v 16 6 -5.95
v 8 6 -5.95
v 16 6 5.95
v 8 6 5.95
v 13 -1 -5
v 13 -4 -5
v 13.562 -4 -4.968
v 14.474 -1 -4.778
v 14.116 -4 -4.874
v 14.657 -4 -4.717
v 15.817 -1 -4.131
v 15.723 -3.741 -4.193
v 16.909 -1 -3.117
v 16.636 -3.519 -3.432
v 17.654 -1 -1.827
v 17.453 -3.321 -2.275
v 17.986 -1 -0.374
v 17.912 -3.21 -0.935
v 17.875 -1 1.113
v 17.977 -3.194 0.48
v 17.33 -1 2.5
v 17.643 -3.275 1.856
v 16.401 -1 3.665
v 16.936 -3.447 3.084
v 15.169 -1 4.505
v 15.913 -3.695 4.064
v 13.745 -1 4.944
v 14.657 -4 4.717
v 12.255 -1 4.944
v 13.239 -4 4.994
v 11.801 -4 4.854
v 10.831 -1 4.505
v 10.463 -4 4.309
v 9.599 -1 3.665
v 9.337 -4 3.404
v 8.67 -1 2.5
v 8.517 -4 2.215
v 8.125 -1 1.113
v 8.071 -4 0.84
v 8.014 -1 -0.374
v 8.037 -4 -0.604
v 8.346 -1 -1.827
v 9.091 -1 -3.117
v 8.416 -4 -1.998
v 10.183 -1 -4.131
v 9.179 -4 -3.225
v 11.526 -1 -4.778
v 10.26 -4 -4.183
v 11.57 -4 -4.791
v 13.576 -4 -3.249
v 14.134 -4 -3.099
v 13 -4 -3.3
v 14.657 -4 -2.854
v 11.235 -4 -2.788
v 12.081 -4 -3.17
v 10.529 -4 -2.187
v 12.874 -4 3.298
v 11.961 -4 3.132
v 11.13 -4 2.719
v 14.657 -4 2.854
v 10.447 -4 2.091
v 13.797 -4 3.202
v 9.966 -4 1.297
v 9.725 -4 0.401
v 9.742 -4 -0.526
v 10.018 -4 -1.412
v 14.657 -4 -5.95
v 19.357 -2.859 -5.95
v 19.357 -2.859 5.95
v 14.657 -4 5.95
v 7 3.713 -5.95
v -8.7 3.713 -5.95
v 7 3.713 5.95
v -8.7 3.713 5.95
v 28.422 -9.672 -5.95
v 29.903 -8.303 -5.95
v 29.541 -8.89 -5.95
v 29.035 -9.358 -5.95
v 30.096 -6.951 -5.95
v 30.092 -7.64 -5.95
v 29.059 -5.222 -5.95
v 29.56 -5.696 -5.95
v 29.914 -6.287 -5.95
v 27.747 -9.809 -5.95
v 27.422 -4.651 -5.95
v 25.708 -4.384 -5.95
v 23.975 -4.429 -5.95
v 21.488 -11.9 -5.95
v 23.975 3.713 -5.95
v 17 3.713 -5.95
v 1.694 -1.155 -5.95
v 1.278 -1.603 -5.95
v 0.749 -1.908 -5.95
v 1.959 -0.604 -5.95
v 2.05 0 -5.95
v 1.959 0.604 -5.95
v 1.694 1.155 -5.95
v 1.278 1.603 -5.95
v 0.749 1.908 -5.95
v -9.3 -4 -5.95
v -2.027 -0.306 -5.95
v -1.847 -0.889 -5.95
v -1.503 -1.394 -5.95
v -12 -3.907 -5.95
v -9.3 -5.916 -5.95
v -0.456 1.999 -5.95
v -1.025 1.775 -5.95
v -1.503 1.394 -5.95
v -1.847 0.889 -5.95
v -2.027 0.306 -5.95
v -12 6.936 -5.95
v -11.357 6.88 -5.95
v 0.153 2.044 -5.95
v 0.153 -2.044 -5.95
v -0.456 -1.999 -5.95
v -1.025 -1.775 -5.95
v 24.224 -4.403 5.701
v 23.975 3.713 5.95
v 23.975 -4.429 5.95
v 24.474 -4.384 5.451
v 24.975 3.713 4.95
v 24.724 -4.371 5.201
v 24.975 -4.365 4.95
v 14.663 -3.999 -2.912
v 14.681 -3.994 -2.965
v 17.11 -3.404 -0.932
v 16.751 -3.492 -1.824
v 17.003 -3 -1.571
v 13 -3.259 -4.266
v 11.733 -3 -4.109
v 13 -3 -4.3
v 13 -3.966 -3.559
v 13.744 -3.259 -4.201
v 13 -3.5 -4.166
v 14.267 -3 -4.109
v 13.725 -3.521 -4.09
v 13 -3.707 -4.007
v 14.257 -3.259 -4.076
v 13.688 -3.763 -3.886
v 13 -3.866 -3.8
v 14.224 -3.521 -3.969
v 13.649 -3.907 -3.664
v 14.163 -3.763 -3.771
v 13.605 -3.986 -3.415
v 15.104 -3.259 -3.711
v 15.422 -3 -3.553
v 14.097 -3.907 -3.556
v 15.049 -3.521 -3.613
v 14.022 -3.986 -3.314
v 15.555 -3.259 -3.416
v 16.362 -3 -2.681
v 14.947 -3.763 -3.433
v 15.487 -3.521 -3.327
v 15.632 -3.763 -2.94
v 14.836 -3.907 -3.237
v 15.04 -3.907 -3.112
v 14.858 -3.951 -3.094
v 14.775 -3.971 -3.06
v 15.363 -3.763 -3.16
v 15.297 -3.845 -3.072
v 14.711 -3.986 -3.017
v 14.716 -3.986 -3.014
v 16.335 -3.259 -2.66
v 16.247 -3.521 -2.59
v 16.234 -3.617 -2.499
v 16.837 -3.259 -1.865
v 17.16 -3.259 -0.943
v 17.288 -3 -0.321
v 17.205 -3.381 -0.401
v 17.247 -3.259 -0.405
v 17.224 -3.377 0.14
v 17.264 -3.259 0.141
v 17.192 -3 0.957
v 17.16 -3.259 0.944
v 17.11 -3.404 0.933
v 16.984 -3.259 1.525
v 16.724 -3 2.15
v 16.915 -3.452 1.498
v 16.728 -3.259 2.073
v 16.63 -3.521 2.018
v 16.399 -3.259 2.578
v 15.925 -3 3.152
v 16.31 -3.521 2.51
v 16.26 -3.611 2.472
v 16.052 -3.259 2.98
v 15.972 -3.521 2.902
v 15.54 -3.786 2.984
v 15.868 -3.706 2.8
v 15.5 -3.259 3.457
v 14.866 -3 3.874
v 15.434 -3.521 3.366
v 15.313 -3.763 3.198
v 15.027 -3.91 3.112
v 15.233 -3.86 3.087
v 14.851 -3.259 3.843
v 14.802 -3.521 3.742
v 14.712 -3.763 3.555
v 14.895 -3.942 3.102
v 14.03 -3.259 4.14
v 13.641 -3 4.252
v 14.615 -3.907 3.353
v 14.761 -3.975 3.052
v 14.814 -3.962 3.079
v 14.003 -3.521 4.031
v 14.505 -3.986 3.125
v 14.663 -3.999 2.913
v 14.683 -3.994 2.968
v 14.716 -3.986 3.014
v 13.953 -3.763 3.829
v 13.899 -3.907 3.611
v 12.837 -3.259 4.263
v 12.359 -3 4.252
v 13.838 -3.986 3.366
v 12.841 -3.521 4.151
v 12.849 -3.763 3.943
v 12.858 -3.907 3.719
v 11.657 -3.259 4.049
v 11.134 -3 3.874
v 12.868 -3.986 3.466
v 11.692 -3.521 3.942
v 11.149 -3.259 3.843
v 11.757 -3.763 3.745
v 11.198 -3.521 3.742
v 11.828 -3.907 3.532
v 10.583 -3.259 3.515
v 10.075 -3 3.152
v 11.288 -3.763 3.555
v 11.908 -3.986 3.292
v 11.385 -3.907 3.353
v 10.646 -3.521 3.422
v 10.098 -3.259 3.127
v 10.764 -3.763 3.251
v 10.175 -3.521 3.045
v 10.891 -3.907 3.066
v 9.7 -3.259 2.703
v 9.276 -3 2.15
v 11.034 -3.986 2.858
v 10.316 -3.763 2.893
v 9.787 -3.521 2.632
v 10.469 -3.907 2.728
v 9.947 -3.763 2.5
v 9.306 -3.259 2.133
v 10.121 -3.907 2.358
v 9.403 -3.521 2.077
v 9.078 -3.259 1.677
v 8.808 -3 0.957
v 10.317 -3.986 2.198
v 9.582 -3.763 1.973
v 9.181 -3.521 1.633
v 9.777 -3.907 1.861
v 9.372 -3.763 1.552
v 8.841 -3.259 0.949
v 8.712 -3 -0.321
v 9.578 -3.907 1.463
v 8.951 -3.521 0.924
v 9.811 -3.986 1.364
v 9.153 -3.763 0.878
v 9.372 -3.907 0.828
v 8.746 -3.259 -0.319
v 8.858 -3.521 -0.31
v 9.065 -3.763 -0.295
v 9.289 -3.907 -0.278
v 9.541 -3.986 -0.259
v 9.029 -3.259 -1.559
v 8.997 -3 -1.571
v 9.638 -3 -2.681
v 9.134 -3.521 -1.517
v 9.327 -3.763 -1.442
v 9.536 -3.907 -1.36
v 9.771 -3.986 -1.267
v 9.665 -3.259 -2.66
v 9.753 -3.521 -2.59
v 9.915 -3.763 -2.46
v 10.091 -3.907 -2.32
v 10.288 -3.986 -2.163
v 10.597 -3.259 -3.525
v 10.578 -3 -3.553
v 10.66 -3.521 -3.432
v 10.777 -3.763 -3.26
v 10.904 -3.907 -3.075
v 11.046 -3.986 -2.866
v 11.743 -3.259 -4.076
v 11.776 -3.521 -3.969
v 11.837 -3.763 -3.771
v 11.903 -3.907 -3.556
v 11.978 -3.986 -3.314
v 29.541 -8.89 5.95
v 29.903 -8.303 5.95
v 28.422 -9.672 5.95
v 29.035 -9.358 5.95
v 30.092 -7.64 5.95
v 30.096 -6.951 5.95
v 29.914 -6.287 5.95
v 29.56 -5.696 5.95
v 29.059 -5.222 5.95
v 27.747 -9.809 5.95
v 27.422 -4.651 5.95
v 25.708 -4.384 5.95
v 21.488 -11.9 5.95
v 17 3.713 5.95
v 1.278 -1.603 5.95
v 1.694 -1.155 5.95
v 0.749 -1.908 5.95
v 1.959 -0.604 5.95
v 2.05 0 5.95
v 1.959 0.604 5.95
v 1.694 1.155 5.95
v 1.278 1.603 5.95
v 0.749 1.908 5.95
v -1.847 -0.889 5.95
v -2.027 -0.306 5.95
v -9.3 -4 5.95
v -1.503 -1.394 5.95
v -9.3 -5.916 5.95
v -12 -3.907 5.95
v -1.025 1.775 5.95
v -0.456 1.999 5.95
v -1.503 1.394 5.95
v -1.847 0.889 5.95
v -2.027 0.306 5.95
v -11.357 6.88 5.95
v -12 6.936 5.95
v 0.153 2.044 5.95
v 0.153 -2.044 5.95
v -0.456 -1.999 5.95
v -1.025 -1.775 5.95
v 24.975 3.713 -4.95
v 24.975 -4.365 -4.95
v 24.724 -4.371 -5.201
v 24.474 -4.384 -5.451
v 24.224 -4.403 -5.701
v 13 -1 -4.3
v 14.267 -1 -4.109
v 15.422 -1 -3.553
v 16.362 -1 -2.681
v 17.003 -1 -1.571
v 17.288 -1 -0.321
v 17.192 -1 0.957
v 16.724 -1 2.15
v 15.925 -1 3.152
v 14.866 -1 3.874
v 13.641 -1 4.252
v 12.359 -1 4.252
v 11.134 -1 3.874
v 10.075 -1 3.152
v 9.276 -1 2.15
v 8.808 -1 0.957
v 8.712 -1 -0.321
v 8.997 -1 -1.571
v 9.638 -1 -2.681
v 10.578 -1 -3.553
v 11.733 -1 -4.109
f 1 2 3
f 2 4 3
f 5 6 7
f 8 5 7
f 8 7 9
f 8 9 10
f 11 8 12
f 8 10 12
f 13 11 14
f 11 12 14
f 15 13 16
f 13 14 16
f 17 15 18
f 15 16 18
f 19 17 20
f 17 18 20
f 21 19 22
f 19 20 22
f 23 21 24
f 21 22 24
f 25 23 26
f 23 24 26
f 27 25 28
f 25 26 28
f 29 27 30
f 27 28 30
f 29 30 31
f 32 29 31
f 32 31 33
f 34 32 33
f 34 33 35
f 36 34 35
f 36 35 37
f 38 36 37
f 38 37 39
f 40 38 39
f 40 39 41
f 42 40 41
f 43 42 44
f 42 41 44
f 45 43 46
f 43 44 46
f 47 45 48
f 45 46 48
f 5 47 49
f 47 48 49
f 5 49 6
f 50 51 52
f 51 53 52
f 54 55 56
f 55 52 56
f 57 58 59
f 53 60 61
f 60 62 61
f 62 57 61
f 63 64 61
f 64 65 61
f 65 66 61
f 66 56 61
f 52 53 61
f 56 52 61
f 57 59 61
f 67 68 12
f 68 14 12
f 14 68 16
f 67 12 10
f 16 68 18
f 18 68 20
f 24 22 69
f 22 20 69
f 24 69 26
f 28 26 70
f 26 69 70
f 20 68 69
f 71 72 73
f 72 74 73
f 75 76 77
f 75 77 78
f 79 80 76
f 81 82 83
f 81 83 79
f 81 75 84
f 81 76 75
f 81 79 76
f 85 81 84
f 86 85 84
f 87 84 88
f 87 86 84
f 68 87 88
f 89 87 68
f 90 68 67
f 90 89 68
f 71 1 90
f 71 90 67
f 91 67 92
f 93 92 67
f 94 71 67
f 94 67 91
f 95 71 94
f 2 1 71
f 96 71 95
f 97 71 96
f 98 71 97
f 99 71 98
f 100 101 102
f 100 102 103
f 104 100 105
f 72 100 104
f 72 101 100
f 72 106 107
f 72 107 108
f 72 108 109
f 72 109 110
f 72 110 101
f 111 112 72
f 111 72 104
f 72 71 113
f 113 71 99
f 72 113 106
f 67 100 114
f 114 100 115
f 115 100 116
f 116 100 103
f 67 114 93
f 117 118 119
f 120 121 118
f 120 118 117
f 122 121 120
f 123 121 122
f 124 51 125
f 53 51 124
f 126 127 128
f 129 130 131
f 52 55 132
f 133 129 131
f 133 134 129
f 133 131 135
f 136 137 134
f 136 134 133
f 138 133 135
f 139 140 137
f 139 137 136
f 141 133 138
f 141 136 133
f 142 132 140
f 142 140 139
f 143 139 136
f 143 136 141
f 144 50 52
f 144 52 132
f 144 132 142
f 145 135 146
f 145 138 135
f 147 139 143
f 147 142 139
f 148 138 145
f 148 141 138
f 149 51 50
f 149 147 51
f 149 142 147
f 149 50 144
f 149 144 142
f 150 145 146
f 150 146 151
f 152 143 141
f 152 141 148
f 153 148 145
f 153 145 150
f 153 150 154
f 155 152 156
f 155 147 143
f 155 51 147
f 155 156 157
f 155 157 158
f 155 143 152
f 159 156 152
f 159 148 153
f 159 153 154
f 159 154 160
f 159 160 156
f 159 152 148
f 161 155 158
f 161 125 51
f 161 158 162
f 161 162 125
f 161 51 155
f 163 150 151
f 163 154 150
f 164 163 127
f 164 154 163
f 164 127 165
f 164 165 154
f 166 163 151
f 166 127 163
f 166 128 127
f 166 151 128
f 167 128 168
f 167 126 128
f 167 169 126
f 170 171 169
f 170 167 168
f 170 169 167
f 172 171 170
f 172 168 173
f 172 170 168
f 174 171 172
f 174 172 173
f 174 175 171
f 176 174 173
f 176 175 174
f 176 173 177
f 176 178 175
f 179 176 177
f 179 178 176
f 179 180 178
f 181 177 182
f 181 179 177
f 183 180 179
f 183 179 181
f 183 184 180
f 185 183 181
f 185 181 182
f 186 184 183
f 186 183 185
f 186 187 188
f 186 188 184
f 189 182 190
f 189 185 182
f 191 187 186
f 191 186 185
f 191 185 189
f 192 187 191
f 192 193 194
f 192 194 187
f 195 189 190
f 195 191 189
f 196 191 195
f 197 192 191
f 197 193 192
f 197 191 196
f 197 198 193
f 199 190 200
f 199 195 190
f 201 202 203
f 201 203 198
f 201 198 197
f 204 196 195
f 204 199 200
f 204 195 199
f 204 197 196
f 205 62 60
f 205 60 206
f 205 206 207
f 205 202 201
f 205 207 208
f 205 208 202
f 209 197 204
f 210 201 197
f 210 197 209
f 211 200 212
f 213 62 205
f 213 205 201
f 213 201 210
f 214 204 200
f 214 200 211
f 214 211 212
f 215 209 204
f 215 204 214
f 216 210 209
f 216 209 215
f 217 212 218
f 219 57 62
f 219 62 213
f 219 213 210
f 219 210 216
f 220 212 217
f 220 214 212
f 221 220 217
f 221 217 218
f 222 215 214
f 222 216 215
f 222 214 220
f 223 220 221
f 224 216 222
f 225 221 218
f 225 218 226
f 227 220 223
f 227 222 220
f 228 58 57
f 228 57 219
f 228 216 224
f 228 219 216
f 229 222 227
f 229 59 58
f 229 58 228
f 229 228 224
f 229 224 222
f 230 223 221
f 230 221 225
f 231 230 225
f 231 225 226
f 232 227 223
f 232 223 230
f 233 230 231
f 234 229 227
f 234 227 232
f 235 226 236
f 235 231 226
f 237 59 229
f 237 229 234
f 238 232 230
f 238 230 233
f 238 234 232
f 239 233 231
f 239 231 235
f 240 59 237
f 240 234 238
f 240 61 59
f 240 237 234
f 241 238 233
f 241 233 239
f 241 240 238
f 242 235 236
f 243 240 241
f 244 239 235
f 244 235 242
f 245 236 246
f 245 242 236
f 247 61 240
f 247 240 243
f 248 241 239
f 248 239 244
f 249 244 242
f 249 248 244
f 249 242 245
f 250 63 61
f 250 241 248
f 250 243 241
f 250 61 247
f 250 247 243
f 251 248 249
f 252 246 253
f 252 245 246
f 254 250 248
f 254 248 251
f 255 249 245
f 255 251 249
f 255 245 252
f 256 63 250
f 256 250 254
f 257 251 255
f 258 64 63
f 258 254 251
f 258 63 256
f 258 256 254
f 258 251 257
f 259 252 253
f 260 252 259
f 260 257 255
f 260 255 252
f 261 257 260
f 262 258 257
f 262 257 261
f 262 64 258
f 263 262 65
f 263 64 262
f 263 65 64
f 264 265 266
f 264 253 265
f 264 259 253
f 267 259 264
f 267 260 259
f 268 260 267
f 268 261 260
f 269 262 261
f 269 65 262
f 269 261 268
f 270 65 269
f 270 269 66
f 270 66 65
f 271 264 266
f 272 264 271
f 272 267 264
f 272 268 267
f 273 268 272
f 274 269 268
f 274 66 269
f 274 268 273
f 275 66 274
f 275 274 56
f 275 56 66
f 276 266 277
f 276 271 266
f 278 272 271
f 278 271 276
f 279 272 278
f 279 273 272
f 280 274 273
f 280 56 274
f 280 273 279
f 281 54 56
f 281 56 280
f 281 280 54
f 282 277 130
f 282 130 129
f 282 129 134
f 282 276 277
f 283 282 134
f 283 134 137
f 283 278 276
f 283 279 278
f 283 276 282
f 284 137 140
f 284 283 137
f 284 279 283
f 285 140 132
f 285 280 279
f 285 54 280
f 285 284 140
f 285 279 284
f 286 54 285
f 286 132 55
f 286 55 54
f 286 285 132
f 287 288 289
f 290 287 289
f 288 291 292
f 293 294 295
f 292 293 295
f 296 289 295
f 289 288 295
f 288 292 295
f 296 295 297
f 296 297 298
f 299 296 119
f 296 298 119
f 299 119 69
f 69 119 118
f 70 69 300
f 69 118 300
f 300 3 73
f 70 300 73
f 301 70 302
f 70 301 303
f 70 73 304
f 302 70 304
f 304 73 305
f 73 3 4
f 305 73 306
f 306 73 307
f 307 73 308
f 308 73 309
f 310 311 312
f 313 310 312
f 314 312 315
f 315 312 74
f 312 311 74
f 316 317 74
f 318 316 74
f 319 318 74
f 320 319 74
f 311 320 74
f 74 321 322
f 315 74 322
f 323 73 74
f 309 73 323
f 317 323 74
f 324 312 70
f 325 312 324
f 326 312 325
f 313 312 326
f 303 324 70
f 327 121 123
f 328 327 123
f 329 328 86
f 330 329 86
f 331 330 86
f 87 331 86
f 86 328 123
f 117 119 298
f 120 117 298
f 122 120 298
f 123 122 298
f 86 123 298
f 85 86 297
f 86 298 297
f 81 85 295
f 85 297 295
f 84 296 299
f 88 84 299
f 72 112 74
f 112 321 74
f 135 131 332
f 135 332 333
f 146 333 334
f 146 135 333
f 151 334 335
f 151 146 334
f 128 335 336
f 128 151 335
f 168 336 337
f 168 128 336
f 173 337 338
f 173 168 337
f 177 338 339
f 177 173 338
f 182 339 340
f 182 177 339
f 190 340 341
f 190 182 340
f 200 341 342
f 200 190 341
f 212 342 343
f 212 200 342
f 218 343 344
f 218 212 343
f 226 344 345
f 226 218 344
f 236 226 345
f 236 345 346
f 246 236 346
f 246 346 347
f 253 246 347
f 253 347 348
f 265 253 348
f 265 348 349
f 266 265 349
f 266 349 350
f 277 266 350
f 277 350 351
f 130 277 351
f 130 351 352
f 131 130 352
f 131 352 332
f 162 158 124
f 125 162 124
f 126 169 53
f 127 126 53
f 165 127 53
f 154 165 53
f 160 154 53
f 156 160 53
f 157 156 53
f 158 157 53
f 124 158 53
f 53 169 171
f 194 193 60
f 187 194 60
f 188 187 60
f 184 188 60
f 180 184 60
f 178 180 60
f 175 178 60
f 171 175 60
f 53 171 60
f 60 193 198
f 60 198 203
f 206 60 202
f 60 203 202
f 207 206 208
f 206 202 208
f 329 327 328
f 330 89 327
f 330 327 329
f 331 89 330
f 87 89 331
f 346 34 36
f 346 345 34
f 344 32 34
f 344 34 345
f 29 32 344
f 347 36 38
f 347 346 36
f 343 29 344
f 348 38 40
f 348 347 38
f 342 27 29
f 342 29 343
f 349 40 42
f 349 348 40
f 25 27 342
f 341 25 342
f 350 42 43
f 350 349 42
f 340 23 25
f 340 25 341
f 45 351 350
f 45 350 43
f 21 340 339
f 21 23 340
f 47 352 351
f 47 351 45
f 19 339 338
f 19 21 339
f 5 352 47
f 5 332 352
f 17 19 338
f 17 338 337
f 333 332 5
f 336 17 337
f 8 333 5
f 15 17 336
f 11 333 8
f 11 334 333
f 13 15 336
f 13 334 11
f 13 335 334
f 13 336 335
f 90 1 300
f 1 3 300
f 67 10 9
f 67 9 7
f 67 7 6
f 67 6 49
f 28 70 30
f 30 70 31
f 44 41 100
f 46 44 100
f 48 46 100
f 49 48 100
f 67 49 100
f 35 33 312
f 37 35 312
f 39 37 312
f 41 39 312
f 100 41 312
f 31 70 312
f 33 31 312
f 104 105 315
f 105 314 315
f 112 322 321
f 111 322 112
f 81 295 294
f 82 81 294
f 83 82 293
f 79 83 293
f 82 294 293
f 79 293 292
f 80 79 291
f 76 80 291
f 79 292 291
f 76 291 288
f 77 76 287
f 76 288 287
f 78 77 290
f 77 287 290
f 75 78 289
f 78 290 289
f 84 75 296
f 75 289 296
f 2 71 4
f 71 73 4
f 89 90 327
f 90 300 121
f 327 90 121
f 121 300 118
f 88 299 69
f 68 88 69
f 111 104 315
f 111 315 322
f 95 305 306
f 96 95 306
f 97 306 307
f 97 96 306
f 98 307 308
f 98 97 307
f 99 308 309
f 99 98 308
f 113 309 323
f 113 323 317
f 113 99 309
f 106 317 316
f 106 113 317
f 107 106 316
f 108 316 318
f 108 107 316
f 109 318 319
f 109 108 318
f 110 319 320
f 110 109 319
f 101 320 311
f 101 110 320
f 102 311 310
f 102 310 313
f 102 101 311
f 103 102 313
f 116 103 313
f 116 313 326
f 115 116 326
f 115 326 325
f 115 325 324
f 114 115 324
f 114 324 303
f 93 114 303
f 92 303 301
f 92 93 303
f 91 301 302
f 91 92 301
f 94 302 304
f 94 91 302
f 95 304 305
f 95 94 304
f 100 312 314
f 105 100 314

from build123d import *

# Parameters (mm, degrees)
SKETCH_1_R          = 2.05
EXTRUDE_1_DEPTH     = 5.95
SKETCH_2_R          = 5
SKETCH_2_R_2        = 4.3
CUT_EXTRUDE_1_DEPTH = 3
FILLET_1_R          = 1
CHAMFER_2_SIZE      = 1
CHAMFER_3_SIZE      = 1
CHAMFER_3_SIZE2     = 0.709809686


with BuildPart() as part:
    # 스케치1 → 보스-돌출1 (new, symmetric)
    with BuildSketch(Plane.XY):
        with BuildLine():
            Line((-9.3, -4), (-9.3, -5.916283943))
            Line((-9.3, -5.916283943), (-12, -3.906505398))
            Line((-12, -3.906505398), (-12, 4.145721859))
            Line((-12, 4.145721859), (-12, 7.645721859))
            Line((-12, 7.645721859), (-8.7, 3.712694326))
            Line((-8.7, 3.712694326), (7, 3.712694326))
            Line((7, 3.712694326), (8, 6))
            Line((8, 6), (16, 6))
            Line((16, 6), (17, 3.712694326))
            Line((17, 3.712694326), (20, 3.712694326))
            Line((20, 3.712694326), (24.97481487, 3.712694326))
            Line((24.97481487, 3.712694326), (24.97481487, -4.364515181))
            ThreePointArc((24.97481487, -4.364515181), (27.06415919, -4.568973756), (29.05933214, -5.222003534))
            ThreePointArc((29.05933214, -5.222003534), (30.020110844, -7.978170358), (27.746673373, -9.808753146))
            Line((27.746673373, -9.808753146), (21.488254287, -11.89950036))
            Line((21.488254287, -11.89950036), (19.357468482, -2.858721645))
            Line((19.357468482, -2.858721645), (14.656995804, -4))
            Line((14.656995804, -4), (13.992506615, -4))
            Line((13.992506615, -4), (-9.3, -4))
        make_face()
        Circle(SKETCH_1_R, mode=Mode.SUBTRACT)
    extrude(amount=EXTRUDE_1_DEPTH, both=True)

    # 스케치2 → 컷-돌출1 (cut)
    with BuildSketch(Plane.XZ.offset(4)):
        with Locations(Location((13, 0, 0), (0, 0, 270))):
            Circle(SKETCH_2_R)
        with Locations(Location((13, 0, 0), (0, 0, 270))):
            Circle(SKETCH_2_R_2, mode=Mode.SUBTRACT)
    extrude(amount=-CUT_EXTRUDE_1_DEPTH, mode=Mode.SUBTRACT)

    # 필렛1
    # the kernel refuses this fillet: 1 mm, written as the material it takes off along each edge
    with BuildSketch(Plane(origin=(13, -4, 0), x_dir=(0.9752421696657375, 0, -0.22113957245519109), z_dir=(-0.22113957245519109, 0, -0.9752421696657375))) as fillet_1_piece_1:
        with BuildLine():
            CenterArc((4.3 - FILLET_1_R, -FILLET_1_R), FILLET_1_R, 0, 90)
            Line((4.3 - FILLET_1_R, 0), (4.3 - FILLET_1_R, FILLET_1_R * 0.02))
            Line((4.3 - FILLET_1_R, FILLET_1_R * 0.02), (4.3 + FILLET_1_R * 0.02, FILLET_1_R * 0.02))
            Line((4.3 + FILLET_1_R * 0.02, FILLET_1_R * 0.02), (4.3 + FILLET_1_R * 0.02, -FILLET_1_R))
            Line((4.3 + FILLET_1_R * 0.02, -FILLET_1_R), (4.3, -FILLET_1_R))
        make_face()
    revolve(axis=Axis((13, -4, 0), (0, -1, 0)), revolution_arc=282.775974377, mode=Mode.SUBTRACT)
    with BuildSketch(Plane(origin=(13, -4, 0), x_dir=(0, 0, -1), z_dir=(-1, 0, 0))) as fillet_1_piece_2:
        with BuildLine():
            CenterArc((4.3 - FILLET_1_R, -FILLET_1_R), FILLET_1_R, 0, 90)
            Line((4.3 - FILLET_1_R, 0), (4.3 - FILLET_1_R, FILLET_1_R * 0.02))
            Line((4.3 - FILLET_1_R, FILLET_1_R * 0.02), (4.3 + FILLET_1_R * 0.02, FILLET_1_R * 0.02))
            Line((4.3 + FILLET_1_R * 0.02, FILLET_1_R * 0.02), (4.3 + FILLET_1_R * 0.02, -FILLET_1_R))
            Line((4.3 + FILLET_1_R * 0.02, -FILLET_1_R), (4.3, -FILLET_1_R))
        make_face()
    revolve(axis=Axis((13, -4, 0), (0, -1, 0)), revolution_arc=102.614973236, mode=Mode.SUBTRACT)

    # 모따기2
    chamfer_2_edges = [part.edges().sort_by_distance(p)[0] for p in [
        (24.97481487, -0.325910428, -5.95),
        (24.97481487, -0.325910428, 5.95),
    ]]
    chamfer(chamfer_2_edges, length=CHAMFER_2_SIZE)

    # 모따기3
    chamfer_3_edges = [part.edges().sort_by_distance(p)[0] for p in [
        (-12, 7.645721859, 0),
    ]]
    chamfer_3_side = [part.faces().sort_by_distance(p)[0] for p in [
        (-10.35, 5.679208093, 0),
    ]]
    chamfer(chamfer_3_edges, length=CHAMFER_3_SIZE, length2=CHAMFER_3_SIZE2, reference=chamfer_3_side[0])


solid = part.part
